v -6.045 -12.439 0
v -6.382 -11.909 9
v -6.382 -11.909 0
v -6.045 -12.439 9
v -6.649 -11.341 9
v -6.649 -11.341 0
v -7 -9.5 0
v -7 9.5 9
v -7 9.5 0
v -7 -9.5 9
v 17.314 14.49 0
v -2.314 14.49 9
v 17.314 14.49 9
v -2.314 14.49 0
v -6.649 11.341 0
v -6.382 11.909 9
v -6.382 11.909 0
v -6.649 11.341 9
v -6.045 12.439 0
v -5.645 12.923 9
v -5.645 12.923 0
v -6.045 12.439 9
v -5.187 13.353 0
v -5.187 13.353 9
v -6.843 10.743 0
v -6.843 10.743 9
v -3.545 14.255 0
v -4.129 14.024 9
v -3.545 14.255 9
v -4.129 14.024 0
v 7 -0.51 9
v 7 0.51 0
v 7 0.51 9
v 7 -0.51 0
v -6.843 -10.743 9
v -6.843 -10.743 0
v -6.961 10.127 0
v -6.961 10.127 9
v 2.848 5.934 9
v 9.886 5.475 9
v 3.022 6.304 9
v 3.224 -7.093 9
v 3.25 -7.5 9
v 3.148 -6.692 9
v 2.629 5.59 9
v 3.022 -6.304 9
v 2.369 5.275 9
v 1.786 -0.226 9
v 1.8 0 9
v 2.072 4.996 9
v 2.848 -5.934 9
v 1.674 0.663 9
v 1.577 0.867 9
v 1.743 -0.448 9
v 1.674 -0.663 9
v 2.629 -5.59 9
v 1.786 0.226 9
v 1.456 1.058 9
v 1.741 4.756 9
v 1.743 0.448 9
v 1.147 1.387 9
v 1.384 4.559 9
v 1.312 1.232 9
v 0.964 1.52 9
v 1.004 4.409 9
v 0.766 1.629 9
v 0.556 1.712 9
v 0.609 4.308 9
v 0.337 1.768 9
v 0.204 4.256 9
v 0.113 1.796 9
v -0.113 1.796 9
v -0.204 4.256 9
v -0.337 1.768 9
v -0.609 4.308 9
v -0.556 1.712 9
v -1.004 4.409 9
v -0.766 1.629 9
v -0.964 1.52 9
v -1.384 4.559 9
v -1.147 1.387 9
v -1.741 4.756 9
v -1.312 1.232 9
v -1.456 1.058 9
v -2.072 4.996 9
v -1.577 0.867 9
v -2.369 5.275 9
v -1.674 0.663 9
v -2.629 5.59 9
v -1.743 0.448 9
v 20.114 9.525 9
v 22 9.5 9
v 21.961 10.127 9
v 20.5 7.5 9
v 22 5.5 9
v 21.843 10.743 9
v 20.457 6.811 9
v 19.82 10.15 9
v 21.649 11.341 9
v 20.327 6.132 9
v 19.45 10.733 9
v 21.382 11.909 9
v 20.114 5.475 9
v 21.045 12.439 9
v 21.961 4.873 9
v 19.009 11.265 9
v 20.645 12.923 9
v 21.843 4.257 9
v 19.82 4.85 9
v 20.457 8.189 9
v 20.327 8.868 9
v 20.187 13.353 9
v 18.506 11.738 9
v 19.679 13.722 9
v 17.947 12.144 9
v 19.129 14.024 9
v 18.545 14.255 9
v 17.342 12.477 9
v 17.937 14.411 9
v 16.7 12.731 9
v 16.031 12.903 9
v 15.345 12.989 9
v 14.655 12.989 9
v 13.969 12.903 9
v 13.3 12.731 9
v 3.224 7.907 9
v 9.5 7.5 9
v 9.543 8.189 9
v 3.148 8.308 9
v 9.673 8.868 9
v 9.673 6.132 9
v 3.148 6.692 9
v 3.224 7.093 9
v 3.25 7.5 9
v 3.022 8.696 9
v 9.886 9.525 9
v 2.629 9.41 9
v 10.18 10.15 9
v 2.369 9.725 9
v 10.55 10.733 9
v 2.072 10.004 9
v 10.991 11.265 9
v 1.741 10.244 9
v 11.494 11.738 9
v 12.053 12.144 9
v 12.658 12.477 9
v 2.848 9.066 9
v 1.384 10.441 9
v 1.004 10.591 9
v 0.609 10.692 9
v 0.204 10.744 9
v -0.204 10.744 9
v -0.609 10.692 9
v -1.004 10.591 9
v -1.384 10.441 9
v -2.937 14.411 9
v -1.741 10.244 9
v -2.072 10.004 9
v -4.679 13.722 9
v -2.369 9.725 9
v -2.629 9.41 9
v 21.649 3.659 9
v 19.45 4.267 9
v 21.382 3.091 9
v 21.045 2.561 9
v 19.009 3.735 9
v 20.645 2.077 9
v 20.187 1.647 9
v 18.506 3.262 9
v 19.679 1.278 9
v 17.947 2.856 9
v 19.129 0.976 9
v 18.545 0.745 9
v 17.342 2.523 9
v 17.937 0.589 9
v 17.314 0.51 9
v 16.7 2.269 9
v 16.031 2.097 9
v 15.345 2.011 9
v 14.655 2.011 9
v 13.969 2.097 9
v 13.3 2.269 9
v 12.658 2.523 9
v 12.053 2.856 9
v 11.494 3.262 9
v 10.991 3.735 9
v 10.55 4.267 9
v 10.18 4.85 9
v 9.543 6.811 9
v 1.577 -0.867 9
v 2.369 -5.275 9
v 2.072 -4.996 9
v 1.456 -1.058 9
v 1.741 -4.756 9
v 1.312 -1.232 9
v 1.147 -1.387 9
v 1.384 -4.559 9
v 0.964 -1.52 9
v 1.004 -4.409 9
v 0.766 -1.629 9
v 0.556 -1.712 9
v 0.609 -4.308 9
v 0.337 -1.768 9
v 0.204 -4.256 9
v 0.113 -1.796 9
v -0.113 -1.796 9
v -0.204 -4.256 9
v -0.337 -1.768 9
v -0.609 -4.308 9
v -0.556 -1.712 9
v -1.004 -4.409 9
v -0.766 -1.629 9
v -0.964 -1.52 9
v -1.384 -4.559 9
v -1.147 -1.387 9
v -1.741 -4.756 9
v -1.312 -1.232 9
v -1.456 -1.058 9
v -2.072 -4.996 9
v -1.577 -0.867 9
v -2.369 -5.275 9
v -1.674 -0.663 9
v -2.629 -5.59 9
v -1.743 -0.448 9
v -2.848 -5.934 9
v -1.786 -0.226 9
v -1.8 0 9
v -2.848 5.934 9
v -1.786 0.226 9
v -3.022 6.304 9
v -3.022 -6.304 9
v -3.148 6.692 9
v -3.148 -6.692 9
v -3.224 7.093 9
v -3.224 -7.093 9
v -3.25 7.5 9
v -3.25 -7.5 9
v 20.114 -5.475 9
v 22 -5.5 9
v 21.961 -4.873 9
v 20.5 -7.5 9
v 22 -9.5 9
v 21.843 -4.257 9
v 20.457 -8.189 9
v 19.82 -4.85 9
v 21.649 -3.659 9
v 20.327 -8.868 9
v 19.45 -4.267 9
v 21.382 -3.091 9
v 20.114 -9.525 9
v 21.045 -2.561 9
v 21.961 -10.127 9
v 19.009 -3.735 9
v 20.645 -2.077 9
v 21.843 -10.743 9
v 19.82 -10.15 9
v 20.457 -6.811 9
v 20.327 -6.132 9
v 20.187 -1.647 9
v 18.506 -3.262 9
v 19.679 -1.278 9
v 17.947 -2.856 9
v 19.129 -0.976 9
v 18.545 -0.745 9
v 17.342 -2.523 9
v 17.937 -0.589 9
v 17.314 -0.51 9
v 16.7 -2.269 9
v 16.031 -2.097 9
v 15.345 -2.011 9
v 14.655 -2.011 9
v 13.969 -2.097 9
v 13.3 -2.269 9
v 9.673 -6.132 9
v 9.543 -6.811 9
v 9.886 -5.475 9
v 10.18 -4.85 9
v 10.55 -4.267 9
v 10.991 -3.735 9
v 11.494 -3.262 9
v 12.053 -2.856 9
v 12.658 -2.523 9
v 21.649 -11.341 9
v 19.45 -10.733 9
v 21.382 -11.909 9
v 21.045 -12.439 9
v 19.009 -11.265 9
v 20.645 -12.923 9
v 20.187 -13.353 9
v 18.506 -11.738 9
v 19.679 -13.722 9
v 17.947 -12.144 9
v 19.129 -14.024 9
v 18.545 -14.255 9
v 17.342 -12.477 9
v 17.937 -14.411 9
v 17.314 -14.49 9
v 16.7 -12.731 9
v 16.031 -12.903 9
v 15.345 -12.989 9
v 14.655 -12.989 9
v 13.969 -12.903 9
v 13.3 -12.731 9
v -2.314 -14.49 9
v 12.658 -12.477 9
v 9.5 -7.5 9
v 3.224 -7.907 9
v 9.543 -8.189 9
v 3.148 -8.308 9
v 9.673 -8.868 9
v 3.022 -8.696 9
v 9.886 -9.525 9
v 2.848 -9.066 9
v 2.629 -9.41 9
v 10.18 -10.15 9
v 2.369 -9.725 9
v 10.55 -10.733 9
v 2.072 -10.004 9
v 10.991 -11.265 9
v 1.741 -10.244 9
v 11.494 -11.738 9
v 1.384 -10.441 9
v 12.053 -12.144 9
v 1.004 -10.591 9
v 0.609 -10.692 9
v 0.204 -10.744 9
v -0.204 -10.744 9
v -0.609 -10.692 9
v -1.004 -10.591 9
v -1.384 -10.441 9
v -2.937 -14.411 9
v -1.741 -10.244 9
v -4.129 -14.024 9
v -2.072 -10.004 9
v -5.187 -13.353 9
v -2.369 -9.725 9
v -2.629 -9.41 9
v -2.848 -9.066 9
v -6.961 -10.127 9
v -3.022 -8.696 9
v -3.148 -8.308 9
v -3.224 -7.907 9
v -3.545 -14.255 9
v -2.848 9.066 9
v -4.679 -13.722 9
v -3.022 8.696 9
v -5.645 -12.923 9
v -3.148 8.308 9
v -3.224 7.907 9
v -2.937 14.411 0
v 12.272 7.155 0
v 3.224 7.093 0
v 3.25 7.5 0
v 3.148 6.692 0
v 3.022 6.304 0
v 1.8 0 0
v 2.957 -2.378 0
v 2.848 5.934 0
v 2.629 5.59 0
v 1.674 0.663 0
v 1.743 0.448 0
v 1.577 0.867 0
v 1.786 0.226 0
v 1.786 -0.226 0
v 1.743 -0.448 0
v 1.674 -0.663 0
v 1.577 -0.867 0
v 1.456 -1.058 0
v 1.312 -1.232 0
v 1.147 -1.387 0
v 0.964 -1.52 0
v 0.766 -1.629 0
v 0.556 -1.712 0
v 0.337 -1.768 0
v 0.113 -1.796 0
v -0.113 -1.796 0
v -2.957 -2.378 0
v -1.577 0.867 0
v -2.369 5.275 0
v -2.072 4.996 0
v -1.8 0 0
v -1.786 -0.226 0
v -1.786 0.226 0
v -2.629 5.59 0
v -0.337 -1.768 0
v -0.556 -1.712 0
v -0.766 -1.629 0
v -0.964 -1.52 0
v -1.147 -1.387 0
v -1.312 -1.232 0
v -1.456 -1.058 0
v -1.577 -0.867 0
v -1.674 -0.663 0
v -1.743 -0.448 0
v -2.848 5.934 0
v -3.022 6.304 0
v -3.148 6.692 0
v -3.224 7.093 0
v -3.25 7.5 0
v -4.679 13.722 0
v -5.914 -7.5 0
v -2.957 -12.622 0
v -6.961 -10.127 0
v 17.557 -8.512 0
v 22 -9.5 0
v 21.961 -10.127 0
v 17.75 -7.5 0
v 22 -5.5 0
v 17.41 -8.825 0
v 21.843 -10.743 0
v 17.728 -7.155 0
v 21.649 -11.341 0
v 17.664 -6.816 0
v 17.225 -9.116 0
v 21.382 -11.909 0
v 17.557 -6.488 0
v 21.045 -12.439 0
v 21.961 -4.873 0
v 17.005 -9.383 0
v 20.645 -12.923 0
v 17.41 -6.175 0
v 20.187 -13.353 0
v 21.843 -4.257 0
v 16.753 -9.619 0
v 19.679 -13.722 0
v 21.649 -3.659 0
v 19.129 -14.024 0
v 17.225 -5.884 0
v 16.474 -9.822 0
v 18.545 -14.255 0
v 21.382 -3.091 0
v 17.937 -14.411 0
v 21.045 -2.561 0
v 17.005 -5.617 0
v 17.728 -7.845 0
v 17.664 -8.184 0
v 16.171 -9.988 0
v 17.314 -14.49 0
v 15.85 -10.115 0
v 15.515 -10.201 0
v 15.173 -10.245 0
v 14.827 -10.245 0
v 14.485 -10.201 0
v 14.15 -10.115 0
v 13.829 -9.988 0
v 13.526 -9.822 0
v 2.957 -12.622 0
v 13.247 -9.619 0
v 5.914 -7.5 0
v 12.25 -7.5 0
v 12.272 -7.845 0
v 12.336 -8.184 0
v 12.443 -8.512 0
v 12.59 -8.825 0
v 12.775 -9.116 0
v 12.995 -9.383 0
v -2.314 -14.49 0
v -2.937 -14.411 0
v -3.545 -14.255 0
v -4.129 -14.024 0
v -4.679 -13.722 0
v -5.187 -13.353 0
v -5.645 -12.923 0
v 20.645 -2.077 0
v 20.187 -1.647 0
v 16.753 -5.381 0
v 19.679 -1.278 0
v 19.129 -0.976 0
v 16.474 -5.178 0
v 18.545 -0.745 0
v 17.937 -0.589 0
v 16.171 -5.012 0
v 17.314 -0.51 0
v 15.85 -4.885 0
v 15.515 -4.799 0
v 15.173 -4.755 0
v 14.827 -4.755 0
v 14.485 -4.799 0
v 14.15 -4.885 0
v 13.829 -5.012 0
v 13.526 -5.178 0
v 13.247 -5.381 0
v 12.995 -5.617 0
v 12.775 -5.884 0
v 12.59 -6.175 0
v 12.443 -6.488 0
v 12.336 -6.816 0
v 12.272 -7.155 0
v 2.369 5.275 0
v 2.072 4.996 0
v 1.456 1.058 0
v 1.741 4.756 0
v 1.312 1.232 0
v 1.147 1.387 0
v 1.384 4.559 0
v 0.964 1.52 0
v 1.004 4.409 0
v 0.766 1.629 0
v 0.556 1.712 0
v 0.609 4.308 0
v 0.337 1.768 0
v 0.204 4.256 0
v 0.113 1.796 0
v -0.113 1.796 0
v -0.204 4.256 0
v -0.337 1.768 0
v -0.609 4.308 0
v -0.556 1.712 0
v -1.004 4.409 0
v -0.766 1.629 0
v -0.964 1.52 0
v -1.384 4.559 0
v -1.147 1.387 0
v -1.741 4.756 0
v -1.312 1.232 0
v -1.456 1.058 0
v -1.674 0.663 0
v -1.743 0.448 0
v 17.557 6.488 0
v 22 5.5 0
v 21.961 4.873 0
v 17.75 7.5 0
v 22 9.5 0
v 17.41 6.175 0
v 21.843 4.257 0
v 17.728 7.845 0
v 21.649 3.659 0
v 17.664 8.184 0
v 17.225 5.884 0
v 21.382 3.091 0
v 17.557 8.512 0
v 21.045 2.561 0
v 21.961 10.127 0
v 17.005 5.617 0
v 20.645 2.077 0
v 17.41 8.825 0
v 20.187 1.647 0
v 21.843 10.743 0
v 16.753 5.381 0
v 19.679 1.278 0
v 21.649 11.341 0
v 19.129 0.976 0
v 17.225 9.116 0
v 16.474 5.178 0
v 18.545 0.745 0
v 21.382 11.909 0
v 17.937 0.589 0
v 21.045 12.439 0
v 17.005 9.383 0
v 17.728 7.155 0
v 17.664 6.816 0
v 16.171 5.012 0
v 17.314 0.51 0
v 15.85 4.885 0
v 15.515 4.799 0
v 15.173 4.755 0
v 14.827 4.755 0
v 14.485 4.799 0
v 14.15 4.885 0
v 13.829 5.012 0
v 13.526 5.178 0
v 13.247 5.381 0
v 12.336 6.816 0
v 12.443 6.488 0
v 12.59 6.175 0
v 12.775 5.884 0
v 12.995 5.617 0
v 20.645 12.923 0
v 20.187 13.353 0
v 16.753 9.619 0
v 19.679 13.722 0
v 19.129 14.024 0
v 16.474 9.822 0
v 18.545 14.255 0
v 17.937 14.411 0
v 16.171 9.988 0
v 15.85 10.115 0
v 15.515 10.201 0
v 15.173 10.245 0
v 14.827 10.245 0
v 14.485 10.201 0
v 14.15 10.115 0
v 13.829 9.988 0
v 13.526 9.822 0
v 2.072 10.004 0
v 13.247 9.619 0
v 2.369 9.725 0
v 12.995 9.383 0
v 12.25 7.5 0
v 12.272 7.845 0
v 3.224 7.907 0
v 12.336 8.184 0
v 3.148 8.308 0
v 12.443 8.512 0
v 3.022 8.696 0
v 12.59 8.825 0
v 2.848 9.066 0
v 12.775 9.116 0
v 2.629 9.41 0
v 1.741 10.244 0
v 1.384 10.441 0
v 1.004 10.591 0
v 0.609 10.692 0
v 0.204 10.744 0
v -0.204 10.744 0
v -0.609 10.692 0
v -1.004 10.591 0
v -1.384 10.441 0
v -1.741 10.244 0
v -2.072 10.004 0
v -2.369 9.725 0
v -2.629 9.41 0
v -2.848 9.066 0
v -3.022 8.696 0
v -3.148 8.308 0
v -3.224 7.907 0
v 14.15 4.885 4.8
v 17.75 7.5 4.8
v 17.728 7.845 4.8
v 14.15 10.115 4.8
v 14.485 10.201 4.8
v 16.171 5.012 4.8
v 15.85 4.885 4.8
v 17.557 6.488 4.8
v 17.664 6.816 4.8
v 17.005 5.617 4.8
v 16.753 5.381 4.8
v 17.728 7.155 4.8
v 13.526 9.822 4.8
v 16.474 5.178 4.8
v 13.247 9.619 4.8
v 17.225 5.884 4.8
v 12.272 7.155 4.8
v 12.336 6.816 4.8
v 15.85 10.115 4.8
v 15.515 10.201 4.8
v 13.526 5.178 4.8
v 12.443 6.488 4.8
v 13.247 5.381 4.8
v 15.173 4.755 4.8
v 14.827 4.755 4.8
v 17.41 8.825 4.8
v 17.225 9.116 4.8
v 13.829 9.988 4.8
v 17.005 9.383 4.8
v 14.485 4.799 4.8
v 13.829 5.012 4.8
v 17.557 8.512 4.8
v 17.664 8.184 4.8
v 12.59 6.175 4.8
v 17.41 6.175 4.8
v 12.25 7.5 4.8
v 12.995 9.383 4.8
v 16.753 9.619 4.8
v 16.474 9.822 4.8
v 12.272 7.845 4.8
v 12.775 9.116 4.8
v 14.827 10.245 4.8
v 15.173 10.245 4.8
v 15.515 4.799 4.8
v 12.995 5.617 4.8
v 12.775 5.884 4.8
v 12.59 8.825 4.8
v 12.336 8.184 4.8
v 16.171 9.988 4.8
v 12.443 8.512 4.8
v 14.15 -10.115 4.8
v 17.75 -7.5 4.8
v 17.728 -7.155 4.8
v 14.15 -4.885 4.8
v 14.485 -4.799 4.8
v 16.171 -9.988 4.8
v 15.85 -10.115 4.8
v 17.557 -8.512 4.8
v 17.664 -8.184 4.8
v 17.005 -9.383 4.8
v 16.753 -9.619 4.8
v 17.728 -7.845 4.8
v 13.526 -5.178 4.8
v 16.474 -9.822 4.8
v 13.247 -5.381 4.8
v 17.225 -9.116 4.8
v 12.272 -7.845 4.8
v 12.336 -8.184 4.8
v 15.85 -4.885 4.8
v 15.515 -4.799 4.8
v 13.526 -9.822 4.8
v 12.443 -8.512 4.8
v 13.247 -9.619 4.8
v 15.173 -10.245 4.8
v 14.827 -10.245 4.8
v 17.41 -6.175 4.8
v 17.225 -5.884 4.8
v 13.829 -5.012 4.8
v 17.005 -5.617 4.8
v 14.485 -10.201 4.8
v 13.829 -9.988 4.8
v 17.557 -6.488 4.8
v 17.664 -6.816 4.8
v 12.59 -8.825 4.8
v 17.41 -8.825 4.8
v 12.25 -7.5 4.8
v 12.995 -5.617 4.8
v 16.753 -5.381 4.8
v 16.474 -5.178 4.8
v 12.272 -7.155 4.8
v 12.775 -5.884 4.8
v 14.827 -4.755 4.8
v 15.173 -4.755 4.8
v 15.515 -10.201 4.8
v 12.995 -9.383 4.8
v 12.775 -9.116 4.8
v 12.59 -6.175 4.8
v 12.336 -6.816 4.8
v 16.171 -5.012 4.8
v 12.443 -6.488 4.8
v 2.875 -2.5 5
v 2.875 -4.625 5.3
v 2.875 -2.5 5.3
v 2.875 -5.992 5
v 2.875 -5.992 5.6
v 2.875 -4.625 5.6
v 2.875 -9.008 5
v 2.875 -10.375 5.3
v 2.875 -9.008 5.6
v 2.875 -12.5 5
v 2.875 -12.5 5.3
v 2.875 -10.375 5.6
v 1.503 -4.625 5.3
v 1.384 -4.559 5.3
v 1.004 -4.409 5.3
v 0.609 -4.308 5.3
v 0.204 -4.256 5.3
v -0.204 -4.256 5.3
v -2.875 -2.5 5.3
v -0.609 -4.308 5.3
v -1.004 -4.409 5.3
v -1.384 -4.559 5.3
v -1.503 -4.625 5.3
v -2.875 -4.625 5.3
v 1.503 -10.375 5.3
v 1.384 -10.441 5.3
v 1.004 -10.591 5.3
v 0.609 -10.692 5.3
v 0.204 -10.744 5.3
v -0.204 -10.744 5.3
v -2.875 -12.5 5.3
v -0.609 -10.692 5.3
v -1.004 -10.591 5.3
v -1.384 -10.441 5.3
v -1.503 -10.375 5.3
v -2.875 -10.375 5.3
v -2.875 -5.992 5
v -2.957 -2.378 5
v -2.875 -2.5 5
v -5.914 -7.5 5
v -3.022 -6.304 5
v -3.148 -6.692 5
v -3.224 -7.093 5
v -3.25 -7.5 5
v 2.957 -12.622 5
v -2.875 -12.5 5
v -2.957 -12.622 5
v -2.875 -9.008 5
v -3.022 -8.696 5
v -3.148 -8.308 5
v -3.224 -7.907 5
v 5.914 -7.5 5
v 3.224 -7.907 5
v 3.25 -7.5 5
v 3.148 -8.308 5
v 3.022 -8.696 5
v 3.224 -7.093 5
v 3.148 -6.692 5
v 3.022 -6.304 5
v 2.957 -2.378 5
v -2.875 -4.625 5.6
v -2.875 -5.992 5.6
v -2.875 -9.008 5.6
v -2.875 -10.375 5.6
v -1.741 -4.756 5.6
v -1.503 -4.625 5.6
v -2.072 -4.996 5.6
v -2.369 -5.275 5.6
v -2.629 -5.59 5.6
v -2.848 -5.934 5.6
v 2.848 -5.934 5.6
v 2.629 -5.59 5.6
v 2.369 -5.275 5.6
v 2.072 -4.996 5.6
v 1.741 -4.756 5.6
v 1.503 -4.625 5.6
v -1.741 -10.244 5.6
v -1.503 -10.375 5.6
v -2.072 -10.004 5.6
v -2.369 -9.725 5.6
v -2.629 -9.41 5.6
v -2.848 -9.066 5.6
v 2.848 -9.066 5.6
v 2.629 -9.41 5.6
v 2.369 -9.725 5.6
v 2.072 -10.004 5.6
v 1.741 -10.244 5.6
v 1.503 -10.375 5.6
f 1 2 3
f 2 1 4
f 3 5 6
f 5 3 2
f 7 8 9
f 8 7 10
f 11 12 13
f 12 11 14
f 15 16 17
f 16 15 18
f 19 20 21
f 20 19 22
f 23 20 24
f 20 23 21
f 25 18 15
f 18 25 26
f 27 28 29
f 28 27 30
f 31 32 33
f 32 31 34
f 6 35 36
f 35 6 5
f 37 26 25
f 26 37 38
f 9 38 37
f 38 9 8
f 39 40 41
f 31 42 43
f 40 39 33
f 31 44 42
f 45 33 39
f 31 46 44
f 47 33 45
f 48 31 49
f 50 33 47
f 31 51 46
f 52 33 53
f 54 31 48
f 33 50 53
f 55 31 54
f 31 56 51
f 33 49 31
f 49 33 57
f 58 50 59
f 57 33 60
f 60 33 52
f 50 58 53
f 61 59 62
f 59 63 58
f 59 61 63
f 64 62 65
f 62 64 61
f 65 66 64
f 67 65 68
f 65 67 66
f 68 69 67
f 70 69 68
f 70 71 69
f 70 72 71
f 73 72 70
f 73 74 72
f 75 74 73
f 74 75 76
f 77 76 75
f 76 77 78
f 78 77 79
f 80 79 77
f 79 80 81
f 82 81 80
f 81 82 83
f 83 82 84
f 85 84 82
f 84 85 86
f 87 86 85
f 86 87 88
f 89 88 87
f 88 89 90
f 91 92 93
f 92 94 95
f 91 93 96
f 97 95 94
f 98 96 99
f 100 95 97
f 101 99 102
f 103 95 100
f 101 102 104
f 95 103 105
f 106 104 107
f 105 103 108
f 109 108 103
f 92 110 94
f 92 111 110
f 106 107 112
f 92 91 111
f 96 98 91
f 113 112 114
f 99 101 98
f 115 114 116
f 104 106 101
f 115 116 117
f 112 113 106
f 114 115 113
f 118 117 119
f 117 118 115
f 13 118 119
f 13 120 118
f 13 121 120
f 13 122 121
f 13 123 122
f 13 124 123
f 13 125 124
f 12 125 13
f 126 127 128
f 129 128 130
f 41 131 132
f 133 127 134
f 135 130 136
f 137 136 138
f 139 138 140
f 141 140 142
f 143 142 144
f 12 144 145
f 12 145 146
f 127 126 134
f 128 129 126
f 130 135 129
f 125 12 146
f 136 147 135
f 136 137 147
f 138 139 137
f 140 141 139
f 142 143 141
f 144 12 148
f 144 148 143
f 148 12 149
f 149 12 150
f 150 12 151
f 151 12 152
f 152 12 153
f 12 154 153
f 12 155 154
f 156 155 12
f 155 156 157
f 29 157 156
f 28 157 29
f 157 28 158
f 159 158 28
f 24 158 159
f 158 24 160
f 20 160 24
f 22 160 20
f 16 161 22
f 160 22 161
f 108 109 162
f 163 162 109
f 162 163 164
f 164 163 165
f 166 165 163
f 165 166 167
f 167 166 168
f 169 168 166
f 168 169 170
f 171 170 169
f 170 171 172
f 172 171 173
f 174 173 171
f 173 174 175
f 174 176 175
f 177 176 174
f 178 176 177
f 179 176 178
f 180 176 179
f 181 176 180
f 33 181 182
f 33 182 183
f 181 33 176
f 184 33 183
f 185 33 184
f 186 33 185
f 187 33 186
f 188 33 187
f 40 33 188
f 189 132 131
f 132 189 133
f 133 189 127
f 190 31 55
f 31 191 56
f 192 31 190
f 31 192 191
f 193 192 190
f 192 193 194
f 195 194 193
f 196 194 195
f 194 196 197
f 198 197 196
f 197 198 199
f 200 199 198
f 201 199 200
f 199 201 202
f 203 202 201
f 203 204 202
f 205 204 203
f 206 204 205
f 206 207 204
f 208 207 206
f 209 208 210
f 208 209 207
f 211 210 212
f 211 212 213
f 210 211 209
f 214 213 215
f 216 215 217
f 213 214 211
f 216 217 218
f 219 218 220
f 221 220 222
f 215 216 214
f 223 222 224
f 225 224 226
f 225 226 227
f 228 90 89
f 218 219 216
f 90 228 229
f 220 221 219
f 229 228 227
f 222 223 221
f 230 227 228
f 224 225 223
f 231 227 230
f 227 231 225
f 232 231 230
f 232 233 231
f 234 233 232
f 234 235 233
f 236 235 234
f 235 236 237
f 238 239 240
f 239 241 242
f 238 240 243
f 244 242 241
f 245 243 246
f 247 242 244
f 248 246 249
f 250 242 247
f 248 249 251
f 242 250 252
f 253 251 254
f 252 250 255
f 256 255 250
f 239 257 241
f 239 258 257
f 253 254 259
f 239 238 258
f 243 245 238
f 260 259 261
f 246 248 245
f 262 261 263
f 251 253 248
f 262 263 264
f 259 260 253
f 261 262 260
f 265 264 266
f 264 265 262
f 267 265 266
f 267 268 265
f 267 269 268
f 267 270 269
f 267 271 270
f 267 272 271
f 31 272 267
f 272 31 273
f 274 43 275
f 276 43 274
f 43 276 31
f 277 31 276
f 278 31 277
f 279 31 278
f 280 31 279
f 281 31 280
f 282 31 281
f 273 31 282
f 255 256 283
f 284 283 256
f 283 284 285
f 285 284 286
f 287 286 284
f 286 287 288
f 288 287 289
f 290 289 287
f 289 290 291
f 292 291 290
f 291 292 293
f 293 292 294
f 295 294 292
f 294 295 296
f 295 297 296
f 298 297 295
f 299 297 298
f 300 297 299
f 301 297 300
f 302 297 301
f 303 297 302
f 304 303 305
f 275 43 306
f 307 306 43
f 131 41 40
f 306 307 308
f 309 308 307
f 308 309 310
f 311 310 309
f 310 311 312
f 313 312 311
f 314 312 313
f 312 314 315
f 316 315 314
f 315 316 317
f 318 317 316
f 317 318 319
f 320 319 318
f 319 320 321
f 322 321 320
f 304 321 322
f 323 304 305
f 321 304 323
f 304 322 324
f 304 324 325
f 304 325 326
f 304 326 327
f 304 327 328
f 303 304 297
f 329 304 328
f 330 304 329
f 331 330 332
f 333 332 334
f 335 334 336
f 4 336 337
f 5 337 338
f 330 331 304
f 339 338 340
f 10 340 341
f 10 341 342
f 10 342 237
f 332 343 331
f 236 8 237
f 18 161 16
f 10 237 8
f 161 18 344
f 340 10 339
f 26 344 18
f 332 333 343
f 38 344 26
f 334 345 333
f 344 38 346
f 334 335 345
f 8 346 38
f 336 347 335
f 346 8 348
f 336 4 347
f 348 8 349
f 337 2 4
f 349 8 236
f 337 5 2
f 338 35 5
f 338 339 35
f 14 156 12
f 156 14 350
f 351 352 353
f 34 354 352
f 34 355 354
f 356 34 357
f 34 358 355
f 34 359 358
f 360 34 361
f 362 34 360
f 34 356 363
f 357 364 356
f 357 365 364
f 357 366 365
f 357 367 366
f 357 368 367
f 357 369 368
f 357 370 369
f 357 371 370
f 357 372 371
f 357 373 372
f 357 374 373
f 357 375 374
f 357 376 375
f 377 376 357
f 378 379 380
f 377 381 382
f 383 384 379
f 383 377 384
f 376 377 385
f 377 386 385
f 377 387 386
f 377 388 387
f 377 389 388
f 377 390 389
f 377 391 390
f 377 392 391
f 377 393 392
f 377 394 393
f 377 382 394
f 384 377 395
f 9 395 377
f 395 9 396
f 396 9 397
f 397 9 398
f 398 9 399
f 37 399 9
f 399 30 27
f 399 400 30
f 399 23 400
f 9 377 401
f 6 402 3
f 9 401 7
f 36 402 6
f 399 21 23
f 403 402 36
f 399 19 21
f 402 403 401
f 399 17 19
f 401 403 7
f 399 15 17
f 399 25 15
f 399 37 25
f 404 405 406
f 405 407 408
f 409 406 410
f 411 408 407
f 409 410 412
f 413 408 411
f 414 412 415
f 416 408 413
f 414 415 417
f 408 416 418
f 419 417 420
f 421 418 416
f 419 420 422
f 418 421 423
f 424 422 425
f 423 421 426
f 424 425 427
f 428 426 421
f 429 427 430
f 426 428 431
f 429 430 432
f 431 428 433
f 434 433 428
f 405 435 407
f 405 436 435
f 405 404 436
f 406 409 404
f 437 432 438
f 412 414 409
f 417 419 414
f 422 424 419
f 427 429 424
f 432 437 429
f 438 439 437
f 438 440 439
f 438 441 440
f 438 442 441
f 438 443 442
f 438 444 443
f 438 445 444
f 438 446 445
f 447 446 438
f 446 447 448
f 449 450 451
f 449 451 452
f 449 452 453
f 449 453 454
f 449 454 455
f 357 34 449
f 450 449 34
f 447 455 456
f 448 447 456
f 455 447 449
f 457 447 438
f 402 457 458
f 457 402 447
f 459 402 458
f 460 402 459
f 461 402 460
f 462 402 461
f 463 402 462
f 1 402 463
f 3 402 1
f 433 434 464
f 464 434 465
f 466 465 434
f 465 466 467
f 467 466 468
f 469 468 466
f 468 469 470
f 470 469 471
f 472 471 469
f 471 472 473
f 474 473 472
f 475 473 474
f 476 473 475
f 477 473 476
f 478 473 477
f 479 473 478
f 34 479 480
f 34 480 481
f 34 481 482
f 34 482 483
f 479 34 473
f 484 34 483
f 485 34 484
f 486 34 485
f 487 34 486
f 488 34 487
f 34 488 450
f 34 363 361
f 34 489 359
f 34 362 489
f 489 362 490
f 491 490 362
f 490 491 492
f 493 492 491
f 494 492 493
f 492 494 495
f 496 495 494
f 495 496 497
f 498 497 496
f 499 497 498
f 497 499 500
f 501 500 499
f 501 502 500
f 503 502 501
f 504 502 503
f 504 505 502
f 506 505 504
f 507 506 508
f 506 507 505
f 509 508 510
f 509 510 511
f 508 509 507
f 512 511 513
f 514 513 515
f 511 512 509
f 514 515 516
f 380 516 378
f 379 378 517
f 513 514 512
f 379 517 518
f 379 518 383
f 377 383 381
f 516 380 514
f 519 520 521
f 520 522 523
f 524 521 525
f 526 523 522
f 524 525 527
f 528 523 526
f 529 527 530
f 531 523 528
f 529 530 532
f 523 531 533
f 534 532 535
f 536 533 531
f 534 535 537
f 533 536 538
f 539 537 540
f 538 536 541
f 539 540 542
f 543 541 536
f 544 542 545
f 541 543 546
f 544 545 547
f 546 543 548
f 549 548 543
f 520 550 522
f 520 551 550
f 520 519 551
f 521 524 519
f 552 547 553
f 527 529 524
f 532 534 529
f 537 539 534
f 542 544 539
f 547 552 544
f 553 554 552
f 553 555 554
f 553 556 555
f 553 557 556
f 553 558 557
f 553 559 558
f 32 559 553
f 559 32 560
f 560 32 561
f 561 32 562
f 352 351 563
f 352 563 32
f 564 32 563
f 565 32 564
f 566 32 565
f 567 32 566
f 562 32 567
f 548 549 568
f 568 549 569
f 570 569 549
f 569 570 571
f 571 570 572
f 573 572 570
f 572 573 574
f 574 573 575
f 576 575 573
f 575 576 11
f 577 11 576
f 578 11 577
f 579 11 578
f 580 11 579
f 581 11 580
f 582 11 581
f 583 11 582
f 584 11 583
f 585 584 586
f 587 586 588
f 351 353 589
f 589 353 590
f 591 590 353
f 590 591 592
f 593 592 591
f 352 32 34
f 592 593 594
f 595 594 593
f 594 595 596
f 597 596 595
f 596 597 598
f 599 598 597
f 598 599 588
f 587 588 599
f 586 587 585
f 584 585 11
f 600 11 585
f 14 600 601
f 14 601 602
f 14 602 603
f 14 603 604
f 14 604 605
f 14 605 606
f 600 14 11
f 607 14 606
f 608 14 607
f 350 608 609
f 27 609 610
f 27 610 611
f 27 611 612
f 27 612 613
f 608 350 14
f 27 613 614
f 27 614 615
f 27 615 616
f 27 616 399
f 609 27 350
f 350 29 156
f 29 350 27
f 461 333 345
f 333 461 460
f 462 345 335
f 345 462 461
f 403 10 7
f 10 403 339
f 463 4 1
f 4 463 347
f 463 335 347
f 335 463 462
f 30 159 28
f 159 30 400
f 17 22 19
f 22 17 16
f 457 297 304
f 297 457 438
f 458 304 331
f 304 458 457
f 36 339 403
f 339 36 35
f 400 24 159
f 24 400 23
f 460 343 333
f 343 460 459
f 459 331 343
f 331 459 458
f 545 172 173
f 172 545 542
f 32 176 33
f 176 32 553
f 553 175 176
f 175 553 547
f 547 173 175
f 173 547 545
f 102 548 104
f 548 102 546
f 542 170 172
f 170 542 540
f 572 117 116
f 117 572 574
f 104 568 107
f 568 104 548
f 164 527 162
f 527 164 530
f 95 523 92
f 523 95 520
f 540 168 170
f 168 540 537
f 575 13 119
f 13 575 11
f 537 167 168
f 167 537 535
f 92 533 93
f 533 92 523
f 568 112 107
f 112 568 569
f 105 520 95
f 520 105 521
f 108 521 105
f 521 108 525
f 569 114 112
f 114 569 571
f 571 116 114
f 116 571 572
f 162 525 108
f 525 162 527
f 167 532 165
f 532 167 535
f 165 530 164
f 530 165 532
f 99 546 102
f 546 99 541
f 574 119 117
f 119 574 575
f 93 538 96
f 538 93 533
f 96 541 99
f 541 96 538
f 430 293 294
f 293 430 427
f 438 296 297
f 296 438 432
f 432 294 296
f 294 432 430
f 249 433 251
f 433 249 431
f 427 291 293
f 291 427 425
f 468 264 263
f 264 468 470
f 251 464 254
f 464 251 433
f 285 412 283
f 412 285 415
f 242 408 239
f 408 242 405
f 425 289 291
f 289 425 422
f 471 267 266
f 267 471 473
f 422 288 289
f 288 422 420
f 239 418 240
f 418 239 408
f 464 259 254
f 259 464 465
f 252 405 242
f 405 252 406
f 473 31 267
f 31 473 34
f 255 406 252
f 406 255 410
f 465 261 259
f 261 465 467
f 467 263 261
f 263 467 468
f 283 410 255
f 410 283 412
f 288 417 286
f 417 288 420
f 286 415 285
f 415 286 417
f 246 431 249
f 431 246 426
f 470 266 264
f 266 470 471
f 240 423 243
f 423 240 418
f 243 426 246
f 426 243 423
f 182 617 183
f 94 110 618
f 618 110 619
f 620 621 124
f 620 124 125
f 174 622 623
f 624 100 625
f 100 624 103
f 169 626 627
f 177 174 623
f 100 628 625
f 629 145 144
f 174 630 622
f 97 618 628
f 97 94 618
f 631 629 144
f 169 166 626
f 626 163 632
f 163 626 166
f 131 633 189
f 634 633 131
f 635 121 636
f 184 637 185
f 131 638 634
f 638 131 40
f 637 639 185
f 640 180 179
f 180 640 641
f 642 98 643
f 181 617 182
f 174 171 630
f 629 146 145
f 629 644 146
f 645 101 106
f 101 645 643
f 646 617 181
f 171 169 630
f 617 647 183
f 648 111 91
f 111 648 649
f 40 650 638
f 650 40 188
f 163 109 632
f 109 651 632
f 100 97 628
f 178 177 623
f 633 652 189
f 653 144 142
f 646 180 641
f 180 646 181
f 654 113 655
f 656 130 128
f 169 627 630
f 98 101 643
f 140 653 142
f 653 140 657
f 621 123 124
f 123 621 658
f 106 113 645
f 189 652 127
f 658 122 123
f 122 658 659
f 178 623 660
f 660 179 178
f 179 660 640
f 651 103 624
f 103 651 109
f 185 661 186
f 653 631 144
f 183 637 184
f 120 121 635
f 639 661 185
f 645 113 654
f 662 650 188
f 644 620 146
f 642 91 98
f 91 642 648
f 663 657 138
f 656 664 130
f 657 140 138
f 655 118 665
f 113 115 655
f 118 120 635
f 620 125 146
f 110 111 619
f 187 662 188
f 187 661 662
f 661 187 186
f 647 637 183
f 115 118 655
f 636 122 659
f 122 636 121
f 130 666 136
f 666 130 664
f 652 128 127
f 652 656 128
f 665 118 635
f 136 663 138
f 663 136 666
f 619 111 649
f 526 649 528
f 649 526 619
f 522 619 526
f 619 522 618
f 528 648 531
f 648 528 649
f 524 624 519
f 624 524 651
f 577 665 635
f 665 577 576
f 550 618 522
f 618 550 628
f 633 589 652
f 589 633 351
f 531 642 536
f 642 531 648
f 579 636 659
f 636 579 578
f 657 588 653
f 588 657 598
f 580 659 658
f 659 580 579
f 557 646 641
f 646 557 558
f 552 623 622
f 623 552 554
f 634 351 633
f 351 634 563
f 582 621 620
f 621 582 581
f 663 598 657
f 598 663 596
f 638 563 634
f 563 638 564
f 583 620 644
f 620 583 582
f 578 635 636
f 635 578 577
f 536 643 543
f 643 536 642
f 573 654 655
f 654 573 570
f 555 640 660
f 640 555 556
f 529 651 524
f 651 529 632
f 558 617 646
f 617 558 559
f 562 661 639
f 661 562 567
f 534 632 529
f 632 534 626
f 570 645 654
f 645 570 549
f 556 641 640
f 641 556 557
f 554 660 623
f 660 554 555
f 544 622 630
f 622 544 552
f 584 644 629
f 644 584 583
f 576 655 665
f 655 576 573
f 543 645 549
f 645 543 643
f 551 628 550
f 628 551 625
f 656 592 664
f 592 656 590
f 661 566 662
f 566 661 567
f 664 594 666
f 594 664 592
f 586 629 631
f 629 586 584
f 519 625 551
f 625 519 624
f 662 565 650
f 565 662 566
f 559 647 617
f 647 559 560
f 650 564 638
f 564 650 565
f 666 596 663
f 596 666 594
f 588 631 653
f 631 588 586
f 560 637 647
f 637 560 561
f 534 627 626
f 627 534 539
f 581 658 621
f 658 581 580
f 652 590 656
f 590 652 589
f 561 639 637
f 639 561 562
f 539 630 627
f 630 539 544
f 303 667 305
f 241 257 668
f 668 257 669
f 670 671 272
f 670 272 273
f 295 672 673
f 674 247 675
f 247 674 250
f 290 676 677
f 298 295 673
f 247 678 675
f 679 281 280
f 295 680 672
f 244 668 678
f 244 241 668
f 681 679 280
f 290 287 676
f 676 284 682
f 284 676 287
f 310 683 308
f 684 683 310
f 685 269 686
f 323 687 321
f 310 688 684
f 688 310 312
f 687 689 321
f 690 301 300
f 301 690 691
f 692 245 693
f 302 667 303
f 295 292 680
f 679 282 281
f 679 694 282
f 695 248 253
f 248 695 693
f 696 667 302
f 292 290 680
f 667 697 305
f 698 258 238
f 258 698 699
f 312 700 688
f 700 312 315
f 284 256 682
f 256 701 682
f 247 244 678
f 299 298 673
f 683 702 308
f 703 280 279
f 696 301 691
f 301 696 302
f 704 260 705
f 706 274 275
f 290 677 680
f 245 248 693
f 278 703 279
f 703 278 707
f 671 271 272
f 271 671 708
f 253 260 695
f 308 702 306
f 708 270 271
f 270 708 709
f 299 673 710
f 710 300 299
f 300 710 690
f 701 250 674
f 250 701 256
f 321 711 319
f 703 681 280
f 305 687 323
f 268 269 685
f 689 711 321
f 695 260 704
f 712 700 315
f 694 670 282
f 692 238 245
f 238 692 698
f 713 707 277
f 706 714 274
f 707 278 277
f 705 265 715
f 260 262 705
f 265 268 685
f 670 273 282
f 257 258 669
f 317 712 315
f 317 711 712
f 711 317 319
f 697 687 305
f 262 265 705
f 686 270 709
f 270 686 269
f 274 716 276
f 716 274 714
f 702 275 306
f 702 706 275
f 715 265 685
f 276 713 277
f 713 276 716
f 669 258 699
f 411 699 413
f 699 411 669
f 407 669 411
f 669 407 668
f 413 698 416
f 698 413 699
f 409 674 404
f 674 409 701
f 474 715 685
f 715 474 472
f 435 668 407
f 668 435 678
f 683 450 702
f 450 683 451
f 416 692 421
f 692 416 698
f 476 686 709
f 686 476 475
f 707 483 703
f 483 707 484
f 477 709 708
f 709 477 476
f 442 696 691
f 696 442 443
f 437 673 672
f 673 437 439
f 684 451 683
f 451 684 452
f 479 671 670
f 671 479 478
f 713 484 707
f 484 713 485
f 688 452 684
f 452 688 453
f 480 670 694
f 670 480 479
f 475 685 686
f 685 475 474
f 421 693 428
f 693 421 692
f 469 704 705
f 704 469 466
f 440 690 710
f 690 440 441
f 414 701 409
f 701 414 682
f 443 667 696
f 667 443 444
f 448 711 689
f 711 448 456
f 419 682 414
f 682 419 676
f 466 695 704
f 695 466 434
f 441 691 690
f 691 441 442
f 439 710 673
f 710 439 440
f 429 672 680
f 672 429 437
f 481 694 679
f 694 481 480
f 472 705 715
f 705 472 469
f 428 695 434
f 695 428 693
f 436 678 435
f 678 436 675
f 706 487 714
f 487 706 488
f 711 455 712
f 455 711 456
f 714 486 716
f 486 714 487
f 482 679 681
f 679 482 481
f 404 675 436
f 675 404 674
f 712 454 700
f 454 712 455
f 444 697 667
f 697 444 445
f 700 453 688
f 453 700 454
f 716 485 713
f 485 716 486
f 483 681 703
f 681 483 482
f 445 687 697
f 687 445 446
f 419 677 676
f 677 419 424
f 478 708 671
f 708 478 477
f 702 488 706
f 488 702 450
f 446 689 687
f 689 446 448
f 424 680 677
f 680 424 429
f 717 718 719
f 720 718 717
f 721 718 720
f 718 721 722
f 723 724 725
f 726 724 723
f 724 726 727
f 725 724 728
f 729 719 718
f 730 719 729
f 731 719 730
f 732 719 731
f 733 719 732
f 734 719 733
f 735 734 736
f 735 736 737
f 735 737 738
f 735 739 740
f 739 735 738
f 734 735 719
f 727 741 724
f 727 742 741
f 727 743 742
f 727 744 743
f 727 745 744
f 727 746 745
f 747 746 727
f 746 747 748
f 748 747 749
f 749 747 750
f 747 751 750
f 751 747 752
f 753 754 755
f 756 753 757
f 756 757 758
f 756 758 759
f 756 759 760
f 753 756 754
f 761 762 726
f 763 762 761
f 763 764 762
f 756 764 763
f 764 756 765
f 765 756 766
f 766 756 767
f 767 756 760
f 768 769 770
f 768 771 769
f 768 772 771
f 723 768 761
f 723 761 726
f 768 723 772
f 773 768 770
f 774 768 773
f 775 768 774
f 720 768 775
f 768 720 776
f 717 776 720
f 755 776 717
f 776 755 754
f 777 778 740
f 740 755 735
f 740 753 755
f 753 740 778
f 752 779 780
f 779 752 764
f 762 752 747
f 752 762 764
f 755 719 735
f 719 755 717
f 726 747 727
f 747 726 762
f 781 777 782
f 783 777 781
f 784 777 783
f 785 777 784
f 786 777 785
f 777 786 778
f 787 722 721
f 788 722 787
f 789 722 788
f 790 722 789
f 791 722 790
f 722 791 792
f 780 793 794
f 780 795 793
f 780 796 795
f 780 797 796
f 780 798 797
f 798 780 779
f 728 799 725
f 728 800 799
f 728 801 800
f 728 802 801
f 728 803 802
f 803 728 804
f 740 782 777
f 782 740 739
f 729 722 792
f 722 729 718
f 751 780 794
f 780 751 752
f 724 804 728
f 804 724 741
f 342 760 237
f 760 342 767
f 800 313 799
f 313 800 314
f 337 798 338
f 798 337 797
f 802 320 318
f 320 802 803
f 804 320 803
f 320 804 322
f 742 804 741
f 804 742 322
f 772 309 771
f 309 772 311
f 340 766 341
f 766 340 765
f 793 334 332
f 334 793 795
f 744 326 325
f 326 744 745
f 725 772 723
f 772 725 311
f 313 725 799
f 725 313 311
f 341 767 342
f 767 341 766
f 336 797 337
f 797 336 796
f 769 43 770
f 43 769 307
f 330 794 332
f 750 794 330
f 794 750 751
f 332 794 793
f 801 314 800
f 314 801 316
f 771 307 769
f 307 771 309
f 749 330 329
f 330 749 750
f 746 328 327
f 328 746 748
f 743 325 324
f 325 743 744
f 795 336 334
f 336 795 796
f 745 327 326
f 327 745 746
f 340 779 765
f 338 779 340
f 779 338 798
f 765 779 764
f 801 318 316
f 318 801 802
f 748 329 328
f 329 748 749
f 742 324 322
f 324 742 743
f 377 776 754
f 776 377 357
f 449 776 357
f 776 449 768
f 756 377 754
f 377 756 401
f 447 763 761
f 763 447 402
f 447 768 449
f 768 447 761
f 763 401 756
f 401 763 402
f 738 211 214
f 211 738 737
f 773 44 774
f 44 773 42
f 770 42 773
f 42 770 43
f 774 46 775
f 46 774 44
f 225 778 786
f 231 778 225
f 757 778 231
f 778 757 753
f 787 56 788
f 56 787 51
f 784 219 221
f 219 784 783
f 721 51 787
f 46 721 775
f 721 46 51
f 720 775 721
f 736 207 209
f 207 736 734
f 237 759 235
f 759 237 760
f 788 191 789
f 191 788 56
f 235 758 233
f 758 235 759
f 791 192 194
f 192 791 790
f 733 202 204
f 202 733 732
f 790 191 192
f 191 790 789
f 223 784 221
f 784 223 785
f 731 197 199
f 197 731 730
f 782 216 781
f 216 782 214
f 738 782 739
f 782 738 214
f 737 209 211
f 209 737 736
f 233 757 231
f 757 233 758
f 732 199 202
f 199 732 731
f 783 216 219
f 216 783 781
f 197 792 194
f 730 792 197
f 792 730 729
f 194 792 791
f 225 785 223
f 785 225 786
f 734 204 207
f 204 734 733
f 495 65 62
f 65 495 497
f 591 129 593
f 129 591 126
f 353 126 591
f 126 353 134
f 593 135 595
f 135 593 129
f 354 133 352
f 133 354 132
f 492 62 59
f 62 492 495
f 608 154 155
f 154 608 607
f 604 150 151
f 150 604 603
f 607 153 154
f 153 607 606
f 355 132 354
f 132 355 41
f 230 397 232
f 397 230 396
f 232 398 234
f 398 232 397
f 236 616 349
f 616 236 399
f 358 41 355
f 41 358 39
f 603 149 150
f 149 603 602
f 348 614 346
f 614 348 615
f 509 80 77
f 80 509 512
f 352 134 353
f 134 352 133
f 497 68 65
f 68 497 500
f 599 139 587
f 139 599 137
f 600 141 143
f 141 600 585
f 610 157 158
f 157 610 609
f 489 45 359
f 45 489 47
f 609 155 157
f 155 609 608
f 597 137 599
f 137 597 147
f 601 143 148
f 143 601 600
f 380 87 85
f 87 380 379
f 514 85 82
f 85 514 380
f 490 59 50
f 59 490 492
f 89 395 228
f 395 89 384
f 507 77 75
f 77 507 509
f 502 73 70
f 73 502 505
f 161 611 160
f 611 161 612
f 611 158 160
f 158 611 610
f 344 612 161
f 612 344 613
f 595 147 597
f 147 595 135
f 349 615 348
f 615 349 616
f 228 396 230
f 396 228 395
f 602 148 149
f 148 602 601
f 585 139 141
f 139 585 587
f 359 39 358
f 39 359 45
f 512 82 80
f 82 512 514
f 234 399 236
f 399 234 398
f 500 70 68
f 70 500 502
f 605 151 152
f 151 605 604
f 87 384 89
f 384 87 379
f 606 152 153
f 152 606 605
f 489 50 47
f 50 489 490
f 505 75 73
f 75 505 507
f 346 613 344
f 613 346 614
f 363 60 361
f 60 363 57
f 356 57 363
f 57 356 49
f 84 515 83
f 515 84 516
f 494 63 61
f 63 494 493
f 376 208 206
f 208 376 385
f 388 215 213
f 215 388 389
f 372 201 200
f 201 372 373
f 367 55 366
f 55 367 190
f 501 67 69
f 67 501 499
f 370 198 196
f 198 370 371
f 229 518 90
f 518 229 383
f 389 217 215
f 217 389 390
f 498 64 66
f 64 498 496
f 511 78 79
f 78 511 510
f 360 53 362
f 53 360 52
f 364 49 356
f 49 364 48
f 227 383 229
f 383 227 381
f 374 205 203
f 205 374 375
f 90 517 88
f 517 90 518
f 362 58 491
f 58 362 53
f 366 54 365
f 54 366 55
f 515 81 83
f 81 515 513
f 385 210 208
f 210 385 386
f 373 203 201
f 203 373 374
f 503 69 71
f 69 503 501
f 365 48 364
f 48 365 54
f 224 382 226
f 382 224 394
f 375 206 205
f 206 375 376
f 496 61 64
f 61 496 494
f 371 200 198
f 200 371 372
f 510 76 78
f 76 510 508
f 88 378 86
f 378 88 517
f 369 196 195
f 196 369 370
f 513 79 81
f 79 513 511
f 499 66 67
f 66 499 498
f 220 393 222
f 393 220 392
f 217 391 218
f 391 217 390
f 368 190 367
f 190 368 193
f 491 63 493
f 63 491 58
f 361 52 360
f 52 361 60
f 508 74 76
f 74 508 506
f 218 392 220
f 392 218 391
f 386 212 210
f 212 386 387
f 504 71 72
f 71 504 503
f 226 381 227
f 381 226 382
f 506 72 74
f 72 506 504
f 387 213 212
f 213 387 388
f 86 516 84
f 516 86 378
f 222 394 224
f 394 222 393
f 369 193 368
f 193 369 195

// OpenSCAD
$fn = 50;


difference() {
	union() {
		hull() {
			translate(v = [-2.0000000000, 9.5000000000, 0]) {
				cylinder(h = 9, r = 5);
			}
			translate(v = [2.0000000000, 9.5000000000, 0]) {
				cylinder(h = 9, r = 5);
			}
			translate(v = [-2.0000000000, -9.5000000000, 0]) {
				cylinder(h = 9, r = 5);
			}
			translate(v = [2.0000000000, -9.5000000000, 0]) {
				cylinder(h = 9, r = 5);
			}
		}
		translate(v = [7.5000000000, 7.5000000000, 0]) {
			hull() {
				translate(v = [-9.5000000000, 2.0000000000, 0]) {
					cylinder(h = 9, r = 5);
				}
				translate(v = [9.5000000000, 2.0000000000, 0]) {
					cylinder(h = 9, r = 5);
				}
				translate(v = [-9.5000000000, -2.0000000000, 0]) {
					cylinder(h = 9, r = 5);
				}
				translate(v = [9.5000000000, -2.0000000000, 0]) {
					cylinder(h = 9, r = 5);
				}
			}
		}
		translate(v = [7.5000000000, -7.5000000000, 0]) {
			hull() {
				translate(v = [-9.5000000000, 2.0000000000, 0]) {
					cylinder(h = 9, r = 5);
				}
				translate(v = [9.5000000000, 2.0000000000, 0]) {
					cylinder(h = 9, r = 5);
				}
				translate(v = [-9.5000000000, -2.0000000000, 0]) {
					cylinder(h = 9, r = 5);
				}
				translate(v = [9.5000000000, -2.0000000000, 0]) {
					cylinder(h = 9, r = 5);
				}
			}
		}
	}
	union() {
		translate(v = [15.0000000000, 7.5000000000, 9]) {
			rotate(a = [0, 0, 0]) {
				difference() {
					union() {
						#translate(v = [0, 0, -9.0000000000]) {
							cylinder(h = 9, r = 2.2500000000);
						}
						#translate(v = [0, 0, -4.2000000000]) {
							cylinder(h = 4.2000000000, r1 = 2.7500000000, r2 = 5.5000000000);
						}
						#translate(v = [0, 0, -9.0000000000]) {
							cylinder(h = 9, r = 2.7500000000);
						}
						#translate(v = [0, 0, -9.0000000000]) {
							cylinder(h = 9, r = 2.2500000000);
						}
					}
					union();
				}
			}
		}
		translate(v = [15.0000000000, -7.5000000000, 9]) {
			rotate(a = [0, 0, 0]) {
				difference() {
					union() {
						#translate(v = [0, 0, -9.0000000000]) {
							cylinder(h = 9, r = 2.2500000000);
						}
						#translate(v = [0, 0, -4.2000000000]) {
							cylinder(h = 4.2000000000, r1 = 2.7500000000, r2 = 5.5000000000);
						}
						#translate(v = [0, 0, -9.0000000000]) {
							cylinder(h = 9, r = 2.7500000000);
						}
						#translate(v = [0, 0, -9.0000000000]) {
							cylinder(h = 9, r = 2.2500000000);
						}
					}
					union();
				}
			}
		}
		translate(v = [0.0000000000, -7.5000000000, 0]) {
			rotate(a = [0, 0, 0]) {
				difference() {
					union() {
						#translate(v = [-2.8750000000, -5.0000000000, -0.3000000000]) {
							cube(size = [5.7500000000, 10, 0.3000000000]);
						}
						#translate(v = [-2.8750000000, -2.8750000000, -0.6000000000]) {
							cube(size = [5.7500000000, 5.7500000000, 0.3000000000]);
						}
						#translate(v = [-2.8750000000, -5.0000000000, 5]) {
							cube(size = [5.7500000000, 10, 0.3000000000]);
						}
						#translate(v = [-2.8750000000, -2.8750000000, 5.3000000000]) {
							cube(size = [5.7500000000, 5.7500000000, 0.3000000000]);
						}
						#translate(v = [0, 0, -100.0000000000]) {
							cylinder(h = 200, r = 3.2500000000);
						}
						#linear_extrude(height = 5) {
							polygon(points = [[5.9142500000, 0.0000000000], [2.9571250000, 5.1218907443], [-2.9571250000, 5.1218907443], [-5.9142500000, 0.0000000000], [-2.9571250000, -5.1218907443], [2.9571250000, -5.1218907443]]);
						}
						#translate(v = [-2.8750000000, -5.0000000000, -0.3000000000]) {
							cube(size = [5.7500000000, 10, 0.3000000000]);
						}
						#translate(v = [-2.8750000000, -2.8750000000, -0.6000000000]) {
							cube(size = [5.7500000000, 5.7500000000, 0.3000000000]);
						}
						#translate(v = [-2.8750000000, -5.0000000000, 5]) {
							cube(size = [5.7500000000, 10, 0.3000000000]);
						}
						#translate(v = [-2.8750000000, -2.8750000000, 5.3000000000]) {
							cube(size = [5.7500000000, 5.7500000000, 0.3000000000]);
						}
						#translate(v = [0, 0, -100.0000000000]) {
							cylinder(h = 200, r = 3.2500000000);
						}
						#translate(v = [-2.8750000000, -5.0000000000, -0.3000000000]) {
							cube(size = [5.7500000000, 10, 0.3000000000]);
						}
						#translate(v = [-2.8750000000, -2.8750000000, -0.6000000000]) {
							cube(size = [5.7500000000, 5.7500000000, 0.3000000000]);
						}
						#translate(v = [-2.8750000000, -5.0000000000, 5]) {
							cube(size = [5.7500000000, 10, 0.3000000000]);
						}
						#translate(v = [-2.8750000000, -2.8750000000, 5.3000000000]) {
							cube(size = [5.7500000000, 5.7500000000, 0.3000000000]);
						}
						#translate(v = [0, 0, -100.0000000000]) {
							cylinder(h = 200, r = 3.2500000000);
						}
					}
					union();
				}
			}
		}
		translate(v = [0.0000000000, -7.5000000000, 0]) {
			translate(v = [0, 0, -100]) {
				cylinder(h = 200, r = 3.2500000000);
			}
		}
		translate(v = [0.0000000000, 7.5000000000, 0]) {
			translate(v = [0, 0, -100]) {
				cylinder(h = 200, r = 3.2500000000);
			}
		}
		translate(v = [0.0000000000, -7.5000000000, 0]) {
			translate(v = [0, 0, -100]) {
				cylinder(h = 200, r = 1.8000000000);
			}
		}
		translate(v = [0, 0, -100]) {
			cylinder(h = 200, r = 1.8000000000);
		}
		translate(v = [0.0000000000, 7.5000000000, 0]) {
			translate(v = [0, 0, -100]) {
				cylinder(h = 200, r = 1.8000000000);
			}
		}
	}
}
